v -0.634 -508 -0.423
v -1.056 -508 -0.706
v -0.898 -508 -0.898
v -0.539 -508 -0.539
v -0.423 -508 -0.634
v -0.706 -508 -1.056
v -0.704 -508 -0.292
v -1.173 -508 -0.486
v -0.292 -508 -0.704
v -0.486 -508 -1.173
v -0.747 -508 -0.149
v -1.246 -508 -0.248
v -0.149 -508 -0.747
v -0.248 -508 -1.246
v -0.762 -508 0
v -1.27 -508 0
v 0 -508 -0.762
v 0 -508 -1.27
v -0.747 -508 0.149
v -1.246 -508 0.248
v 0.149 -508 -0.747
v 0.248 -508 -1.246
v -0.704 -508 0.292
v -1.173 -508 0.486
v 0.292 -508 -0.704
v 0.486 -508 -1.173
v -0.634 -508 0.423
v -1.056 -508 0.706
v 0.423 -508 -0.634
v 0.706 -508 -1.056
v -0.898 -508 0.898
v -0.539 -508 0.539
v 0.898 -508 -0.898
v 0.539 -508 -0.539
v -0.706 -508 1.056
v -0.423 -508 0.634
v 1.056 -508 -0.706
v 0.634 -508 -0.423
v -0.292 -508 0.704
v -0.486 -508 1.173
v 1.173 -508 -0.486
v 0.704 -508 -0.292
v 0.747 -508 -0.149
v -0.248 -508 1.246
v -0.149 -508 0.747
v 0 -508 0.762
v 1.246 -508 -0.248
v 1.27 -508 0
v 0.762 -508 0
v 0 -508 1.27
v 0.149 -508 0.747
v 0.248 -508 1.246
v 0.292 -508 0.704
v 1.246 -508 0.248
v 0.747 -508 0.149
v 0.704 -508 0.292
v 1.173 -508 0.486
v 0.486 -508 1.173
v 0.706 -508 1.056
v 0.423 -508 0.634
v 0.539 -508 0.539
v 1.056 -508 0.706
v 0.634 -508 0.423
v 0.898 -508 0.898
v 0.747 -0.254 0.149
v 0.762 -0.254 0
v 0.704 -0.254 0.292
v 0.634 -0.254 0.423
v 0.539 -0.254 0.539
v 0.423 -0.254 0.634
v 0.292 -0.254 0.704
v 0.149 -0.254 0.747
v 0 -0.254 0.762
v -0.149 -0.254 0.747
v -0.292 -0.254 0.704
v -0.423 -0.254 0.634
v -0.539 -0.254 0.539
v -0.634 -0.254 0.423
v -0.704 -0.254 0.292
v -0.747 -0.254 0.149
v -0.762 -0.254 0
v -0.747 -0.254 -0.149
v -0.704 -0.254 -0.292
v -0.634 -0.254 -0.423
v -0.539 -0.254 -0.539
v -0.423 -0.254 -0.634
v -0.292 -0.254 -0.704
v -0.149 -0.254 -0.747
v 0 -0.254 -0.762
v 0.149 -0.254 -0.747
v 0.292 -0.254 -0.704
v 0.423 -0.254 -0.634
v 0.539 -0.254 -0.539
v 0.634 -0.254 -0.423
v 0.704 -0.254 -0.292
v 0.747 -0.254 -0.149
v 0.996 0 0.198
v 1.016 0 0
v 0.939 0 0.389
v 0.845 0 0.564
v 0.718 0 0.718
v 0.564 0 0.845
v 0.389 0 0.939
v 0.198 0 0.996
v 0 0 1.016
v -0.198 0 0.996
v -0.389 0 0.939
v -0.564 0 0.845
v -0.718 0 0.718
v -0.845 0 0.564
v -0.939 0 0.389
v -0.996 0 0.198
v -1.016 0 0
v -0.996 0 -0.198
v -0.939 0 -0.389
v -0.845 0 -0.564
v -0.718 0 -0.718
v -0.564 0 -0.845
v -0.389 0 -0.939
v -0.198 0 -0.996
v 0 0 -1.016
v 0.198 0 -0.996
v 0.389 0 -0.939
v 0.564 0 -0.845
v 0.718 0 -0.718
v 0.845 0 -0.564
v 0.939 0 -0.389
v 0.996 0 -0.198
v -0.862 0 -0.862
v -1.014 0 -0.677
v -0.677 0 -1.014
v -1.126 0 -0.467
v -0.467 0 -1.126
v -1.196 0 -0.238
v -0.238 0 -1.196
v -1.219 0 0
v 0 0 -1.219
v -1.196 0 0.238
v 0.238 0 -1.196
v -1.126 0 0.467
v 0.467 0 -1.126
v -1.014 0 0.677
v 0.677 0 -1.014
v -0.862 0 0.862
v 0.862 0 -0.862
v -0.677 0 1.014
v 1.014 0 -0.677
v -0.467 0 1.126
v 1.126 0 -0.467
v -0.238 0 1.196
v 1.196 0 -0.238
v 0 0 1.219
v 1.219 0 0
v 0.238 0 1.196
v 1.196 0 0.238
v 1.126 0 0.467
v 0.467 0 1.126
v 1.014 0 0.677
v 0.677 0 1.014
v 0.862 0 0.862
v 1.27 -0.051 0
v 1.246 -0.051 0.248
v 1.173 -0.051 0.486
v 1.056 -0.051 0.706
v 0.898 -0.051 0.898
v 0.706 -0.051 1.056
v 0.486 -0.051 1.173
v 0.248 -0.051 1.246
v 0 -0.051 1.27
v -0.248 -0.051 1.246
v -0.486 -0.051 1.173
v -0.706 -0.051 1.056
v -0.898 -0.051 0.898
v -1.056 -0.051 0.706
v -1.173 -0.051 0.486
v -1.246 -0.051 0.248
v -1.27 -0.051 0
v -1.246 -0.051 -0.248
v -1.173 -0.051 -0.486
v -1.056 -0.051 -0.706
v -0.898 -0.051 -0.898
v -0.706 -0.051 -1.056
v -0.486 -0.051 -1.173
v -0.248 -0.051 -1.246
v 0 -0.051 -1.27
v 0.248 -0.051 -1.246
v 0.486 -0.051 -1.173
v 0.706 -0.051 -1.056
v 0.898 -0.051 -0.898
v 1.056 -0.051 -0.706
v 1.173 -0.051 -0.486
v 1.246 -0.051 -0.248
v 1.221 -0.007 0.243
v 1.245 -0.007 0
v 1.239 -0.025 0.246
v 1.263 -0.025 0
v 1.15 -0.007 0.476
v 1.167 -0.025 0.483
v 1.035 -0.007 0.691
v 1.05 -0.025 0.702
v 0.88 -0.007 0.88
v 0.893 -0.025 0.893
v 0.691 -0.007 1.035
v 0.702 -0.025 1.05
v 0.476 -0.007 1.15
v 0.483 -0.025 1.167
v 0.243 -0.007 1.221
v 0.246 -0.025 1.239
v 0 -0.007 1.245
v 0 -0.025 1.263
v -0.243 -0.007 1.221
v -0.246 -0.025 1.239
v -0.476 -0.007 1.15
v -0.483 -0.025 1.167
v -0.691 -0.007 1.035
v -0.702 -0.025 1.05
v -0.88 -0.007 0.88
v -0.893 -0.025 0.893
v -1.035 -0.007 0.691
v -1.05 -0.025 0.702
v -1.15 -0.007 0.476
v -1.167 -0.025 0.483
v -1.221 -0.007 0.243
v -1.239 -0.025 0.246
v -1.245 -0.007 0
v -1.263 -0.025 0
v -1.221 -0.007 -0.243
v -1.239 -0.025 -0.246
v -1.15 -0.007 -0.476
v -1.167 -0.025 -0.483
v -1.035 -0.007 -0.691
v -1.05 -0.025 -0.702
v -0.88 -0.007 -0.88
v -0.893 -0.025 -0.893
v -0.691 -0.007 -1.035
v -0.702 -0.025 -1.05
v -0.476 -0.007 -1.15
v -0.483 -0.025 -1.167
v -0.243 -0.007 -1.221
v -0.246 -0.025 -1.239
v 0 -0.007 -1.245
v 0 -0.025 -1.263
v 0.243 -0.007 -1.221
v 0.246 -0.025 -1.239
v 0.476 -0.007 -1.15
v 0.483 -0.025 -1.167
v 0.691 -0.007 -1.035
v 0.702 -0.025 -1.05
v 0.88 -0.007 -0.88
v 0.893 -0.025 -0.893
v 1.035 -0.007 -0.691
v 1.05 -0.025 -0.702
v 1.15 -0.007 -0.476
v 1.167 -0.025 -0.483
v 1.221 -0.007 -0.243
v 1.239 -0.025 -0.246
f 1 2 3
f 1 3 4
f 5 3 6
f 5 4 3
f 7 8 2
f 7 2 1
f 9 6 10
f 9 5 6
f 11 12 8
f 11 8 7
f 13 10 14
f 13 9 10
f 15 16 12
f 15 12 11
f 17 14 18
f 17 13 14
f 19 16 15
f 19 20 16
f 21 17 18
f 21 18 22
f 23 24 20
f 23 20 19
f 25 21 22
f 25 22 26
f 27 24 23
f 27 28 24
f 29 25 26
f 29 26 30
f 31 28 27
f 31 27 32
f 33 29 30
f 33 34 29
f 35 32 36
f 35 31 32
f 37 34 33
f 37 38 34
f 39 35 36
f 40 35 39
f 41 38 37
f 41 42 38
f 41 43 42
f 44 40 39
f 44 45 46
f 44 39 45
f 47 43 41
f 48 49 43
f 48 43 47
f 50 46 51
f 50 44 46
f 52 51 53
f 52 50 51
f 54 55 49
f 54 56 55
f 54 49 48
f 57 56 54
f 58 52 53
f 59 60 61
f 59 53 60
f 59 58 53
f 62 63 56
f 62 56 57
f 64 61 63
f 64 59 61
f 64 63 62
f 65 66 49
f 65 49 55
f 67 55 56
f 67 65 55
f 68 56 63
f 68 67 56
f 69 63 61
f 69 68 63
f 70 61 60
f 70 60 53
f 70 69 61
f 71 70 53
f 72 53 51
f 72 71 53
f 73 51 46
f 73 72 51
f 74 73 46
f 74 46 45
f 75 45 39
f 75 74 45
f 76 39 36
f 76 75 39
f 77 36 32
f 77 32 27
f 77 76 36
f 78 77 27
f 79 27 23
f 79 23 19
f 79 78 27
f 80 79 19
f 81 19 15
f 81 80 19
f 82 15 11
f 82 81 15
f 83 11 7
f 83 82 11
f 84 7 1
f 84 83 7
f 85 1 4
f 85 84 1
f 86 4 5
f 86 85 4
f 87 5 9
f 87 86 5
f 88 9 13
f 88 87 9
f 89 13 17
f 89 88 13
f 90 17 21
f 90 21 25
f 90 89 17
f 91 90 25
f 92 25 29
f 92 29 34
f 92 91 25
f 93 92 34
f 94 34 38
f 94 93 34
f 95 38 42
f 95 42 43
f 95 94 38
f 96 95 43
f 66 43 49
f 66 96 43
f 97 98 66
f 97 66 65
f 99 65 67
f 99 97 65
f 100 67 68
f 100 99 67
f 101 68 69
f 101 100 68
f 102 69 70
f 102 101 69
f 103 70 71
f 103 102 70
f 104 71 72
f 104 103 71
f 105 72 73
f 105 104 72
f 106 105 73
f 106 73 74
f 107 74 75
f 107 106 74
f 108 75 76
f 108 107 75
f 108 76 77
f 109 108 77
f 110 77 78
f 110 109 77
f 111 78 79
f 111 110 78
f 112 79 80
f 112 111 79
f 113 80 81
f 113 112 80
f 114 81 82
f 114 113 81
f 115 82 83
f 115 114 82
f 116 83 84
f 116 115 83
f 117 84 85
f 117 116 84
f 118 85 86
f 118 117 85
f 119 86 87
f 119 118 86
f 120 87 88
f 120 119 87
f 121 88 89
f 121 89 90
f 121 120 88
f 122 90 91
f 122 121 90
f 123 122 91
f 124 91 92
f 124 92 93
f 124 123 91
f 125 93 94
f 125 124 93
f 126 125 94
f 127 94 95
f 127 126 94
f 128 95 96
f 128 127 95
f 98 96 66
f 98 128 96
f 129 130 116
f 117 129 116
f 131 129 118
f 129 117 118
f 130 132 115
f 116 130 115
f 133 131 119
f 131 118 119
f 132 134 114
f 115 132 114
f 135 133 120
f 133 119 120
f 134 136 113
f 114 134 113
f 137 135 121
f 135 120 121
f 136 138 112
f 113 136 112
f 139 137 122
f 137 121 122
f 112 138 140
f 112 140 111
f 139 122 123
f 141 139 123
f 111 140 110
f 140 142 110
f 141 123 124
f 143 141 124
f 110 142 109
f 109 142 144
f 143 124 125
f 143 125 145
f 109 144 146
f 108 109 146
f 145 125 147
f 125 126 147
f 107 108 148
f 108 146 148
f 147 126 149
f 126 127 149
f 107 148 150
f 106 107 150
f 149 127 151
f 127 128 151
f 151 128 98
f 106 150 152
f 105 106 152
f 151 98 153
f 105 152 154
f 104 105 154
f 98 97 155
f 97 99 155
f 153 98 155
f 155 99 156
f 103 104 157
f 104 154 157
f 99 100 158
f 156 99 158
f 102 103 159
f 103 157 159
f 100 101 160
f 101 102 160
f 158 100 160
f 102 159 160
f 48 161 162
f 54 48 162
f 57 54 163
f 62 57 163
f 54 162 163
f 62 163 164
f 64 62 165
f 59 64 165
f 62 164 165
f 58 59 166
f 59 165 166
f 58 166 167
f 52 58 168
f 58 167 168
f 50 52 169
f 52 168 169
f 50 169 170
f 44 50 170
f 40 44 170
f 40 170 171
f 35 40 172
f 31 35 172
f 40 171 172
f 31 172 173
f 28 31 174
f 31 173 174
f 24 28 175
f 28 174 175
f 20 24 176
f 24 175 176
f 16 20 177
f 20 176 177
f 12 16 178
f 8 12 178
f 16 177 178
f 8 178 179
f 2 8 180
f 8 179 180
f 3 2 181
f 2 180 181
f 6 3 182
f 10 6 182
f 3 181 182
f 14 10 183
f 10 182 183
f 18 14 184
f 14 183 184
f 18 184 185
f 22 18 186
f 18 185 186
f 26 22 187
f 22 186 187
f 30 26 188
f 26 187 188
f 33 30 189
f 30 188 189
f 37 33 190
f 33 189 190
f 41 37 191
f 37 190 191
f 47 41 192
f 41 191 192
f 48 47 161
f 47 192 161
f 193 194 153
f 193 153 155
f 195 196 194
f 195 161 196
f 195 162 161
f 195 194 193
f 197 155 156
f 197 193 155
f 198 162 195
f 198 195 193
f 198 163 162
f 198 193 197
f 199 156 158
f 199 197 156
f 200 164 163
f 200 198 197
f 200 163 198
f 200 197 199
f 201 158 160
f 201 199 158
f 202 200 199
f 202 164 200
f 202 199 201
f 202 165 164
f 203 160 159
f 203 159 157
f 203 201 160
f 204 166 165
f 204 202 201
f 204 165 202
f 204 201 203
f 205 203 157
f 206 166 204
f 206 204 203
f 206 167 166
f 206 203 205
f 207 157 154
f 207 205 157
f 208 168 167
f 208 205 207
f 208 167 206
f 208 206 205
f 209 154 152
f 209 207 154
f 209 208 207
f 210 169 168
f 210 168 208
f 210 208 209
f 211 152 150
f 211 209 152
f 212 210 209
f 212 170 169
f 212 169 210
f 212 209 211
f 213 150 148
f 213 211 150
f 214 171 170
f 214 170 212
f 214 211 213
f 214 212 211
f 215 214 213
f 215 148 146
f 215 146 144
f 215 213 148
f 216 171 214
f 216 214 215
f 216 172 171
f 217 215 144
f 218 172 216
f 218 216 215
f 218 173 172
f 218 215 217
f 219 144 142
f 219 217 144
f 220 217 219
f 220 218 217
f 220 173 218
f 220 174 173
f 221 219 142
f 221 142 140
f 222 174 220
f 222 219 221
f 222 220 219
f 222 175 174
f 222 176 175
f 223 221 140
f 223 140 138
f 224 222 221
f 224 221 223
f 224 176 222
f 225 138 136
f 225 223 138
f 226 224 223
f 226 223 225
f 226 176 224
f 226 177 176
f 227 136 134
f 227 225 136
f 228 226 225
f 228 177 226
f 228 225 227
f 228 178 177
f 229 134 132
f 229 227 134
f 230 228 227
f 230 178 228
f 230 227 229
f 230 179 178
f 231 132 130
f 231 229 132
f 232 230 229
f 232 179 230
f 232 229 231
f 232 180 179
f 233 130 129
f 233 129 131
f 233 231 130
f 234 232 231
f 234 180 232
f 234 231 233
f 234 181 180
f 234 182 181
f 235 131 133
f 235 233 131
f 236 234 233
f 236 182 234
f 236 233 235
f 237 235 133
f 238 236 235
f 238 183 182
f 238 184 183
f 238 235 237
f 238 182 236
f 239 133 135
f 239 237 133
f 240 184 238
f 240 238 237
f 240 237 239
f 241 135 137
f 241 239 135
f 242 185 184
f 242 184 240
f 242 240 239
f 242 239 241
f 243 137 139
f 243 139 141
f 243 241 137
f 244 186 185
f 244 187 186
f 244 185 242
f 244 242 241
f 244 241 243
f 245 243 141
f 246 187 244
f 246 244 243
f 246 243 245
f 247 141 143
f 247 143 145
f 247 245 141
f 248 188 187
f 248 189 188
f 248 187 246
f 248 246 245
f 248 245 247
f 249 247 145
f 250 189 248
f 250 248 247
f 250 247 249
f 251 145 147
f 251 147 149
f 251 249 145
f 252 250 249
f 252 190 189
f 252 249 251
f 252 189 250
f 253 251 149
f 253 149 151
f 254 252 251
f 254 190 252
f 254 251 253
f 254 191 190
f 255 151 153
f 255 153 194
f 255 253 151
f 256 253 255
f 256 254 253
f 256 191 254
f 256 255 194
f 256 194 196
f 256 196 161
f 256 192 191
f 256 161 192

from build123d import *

# Parameters (mm, degrees)
F0_R     = 1.27
F0_R_2   = 0.762
F1_DEPTH = 508
F2_SIZE  = 0.254
F3_R     = 0.0508


with BuildPart() as f1:
    # F0 (on Front) → F1 (new body)
    with BuildSketch(Plane.XZ):
        Circle(F0_R)
        Circle(F0_R_2, mode=Mode.SUBTRACT)
    extrude(amount=F1_DEPTH)

    # F2
    f2_edges = [f1.edges().sort_by_distance(p)[0] for p in [
        (-0.762, 0, 0),
    ]]
    chamfer(f2_edges, length=F2_SIZE)

    # F3
    f3_edges = [f1.edges().sort_by_distance(p)[0] for p in [
        (-1.27, 0, 0),
    ]]
    fillet(f3_edges, radius=F3_R)


solid = f1.part
